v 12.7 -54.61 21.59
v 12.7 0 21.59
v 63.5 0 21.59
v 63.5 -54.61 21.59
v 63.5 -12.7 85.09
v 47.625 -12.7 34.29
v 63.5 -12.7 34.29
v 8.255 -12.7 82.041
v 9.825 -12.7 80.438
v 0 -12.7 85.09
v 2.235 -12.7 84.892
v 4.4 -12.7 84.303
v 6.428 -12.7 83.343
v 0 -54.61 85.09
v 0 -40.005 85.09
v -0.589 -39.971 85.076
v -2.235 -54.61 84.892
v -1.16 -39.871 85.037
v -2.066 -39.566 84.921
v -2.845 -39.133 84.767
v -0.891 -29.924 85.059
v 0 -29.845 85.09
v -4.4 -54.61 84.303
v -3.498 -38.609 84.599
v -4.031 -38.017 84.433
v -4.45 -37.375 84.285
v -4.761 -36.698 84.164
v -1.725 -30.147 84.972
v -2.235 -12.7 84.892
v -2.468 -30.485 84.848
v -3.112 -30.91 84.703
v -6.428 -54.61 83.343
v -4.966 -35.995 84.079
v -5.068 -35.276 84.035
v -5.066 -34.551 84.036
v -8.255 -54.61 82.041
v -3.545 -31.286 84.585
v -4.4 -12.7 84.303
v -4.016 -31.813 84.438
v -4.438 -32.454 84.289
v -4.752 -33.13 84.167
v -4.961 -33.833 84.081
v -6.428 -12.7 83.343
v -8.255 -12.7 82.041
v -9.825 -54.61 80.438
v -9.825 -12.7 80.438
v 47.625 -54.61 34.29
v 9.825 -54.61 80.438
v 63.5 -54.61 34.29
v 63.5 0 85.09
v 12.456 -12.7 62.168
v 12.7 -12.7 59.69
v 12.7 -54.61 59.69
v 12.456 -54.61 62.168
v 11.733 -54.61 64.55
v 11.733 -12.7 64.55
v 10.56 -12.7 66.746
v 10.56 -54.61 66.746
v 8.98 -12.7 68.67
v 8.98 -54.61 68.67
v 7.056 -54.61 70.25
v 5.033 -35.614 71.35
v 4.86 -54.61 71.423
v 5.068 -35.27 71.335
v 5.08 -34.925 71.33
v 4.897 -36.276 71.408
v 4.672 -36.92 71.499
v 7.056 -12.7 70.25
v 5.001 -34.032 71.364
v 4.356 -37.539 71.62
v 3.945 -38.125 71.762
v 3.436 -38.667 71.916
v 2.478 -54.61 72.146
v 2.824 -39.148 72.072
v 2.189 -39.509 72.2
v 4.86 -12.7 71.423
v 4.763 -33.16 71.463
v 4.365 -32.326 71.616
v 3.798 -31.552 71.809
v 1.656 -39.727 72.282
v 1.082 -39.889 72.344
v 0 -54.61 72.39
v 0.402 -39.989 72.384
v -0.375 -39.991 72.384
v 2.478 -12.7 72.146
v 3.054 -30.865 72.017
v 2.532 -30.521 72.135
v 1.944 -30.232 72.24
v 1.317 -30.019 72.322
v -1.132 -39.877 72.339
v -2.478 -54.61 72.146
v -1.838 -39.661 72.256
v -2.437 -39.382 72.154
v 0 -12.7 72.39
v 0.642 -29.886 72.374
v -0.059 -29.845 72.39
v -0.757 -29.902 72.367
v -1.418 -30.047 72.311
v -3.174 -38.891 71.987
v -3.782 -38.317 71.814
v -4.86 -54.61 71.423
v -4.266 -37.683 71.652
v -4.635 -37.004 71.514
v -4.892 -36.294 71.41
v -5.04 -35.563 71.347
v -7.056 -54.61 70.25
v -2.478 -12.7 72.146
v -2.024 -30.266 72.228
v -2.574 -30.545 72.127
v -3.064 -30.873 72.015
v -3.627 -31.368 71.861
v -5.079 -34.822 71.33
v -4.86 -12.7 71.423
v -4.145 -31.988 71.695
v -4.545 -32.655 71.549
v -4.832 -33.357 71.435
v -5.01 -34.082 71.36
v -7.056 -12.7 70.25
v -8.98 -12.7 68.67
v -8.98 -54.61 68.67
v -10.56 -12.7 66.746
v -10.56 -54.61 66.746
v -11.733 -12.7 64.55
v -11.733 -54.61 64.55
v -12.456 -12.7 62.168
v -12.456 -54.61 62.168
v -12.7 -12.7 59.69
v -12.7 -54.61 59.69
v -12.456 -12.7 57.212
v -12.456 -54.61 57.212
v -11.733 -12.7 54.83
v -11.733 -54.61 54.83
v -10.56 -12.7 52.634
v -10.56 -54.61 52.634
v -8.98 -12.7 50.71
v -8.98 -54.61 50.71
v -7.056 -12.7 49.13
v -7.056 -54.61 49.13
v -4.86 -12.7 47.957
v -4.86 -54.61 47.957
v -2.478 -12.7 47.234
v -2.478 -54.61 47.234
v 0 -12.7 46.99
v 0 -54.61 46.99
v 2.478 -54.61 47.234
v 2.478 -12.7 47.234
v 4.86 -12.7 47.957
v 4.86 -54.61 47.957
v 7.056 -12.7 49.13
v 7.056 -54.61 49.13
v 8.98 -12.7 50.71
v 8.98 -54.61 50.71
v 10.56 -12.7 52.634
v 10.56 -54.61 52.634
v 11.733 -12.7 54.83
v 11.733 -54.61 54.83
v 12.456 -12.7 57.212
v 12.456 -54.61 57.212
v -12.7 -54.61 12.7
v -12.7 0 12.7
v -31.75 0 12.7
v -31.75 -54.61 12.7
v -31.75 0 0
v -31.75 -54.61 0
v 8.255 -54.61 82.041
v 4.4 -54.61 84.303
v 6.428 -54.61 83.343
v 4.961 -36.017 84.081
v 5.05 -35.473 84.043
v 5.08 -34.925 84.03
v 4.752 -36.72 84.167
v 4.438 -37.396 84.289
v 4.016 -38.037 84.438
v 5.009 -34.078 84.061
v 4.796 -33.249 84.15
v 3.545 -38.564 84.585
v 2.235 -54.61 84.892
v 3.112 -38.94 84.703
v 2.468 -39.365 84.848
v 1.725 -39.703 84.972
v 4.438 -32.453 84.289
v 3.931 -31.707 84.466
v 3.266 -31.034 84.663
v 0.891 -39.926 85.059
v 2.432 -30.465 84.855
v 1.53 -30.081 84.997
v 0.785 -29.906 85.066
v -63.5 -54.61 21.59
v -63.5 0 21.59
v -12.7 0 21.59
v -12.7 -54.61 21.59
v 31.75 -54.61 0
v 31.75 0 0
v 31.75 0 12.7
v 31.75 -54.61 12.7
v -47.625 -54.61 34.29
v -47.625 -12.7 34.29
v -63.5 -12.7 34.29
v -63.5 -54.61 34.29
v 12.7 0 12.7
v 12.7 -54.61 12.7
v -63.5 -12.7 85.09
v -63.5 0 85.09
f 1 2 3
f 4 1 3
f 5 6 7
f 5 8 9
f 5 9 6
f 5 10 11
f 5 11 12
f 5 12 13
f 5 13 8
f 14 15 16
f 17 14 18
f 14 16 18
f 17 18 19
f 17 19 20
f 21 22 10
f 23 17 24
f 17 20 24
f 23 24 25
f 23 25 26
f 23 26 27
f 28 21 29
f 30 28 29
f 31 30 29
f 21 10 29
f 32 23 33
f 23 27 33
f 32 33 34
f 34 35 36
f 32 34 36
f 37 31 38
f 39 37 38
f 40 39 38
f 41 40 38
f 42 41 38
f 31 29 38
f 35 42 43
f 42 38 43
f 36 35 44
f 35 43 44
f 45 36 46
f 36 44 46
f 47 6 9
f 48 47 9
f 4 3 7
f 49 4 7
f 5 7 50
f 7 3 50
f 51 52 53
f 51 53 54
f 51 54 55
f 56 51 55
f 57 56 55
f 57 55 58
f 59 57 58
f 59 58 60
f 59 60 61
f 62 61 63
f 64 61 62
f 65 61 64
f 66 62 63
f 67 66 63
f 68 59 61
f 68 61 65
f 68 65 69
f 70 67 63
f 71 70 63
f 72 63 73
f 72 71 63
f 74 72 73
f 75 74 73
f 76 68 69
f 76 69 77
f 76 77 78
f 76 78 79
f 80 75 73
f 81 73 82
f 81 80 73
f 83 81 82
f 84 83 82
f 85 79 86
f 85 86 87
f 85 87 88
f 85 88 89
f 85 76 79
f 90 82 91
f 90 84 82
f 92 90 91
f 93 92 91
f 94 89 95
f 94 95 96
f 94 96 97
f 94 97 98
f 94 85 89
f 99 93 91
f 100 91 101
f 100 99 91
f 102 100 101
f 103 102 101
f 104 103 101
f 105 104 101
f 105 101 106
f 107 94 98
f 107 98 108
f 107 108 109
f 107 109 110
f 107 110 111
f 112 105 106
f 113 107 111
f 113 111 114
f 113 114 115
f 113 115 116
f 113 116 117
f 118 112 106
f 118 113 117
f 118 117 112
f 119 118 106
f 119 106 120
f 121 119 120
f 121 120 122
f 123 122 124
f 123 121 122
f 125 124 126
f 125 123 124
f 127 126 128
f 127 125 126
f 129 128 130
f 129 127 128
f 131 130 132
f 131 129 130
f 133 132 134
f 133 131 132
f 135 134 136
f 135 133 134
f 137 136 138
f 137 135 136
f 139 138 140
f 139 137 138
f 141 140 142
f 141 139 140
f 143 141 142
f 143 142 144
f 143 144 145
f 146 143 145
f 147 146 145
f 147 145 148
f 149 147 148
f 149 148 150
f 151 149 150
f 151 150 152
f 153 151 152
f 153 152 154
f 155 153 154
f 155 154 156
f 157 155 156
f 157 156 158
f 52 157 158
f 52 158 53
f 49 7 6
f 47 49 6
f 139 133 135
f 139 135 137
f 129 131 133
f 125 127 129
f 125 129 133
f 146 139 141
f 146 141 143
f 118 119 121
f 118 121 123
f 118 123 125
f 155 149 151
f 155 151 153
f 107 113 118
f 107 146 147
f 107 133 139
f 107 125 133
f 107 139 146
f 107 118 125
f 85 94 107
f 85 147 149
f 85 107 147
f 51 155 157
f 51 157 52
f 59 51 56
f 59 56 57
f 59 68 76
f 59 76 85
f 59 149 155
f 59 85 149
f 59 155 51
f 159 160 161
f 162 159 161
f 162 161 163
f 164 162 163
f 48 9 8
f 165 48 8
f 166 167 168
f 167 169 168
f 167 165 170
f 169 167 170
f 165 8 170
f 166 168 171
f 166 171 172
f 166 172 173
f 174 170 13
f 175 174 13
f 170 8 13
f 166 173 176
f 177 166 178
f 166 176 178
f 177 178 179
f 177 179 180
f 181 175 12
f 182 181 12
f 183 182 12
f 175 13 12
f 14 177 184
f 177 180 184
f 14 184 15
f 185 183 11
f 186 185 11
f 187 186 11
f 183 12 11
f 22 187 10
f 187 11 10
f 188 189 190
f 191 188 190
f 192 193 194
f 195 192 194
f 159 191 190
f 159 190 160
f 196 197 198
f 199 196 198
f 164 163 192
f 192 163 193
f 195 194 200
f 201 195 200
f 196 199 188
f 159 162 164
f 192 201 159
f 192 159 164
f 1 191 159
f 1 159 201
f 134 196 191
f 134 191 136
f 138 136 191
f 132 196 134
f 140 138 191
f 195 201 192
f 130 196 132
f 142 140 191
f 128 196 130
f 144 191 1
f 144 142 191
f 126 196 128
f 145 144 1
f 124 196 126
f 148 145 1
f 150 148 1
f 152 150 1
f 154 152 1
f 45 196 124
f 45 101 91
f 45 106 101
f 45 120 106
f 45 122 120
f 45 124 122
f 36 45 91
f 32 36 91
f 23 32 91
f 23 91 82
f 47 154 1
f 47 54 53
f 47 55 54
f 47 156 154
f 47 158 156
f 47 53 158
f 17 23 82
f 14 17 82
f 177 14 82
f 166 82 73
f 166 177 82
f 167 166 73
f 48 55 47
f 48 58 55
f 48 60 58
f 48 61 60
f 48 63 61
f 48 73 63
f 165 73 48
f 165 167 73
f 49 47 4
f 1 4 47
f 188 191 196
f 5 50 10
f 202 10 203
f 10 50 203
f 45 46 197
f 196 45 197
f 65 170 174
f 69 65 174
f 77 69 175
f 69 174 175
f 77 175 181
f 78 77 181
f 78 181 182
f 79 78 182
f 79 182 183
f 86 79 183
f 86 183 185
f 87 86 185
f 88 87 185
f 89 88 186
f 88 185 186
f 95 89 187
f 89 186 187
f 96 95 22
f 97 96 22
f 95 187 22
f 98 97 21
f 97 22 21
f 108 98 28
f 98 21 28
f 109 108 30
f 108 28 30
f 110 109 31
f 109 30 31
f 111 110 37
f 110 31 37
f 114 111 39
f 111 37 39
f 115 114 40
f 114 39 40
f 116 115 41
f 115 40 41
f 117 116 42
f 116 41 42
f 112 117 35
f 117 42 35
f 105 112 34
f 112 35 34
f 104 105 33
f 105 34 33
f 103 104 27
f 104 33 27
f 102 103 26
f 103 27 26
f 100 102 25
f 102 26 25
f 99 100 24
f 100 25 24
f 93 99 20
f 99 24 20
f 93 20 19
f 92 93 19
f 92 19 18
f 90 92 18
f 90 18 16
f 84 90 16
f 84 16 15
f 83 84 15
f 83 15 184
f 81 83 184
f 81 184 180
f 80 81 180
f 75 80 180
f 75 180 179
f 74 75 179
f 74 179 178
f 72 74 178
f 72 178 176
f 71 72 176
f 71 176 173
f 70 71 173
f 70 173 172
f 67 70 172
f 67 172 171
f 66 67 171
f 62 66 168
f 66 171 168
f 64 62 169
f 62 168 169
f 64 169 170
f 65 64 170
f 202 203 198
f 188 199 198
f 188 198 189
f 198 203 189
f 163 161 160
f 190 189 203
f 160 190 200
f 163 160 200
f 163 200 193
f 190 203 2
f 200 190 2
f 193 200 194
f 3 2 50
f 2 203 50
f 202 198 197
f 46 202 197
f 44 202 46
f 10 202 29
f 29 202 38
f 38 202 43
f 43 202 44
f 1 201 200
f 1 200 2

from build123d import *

# Parameters (mm, degrees)
F0_R     = 12.7
F1_DEPTH = 54.61
F2_DEPTH = 12.7
F3_DEPTH = 12.7
F4_R     = 5.08
F5_DEPTH = 19.05


with BuildPart() as f1:
    # F0 (on Front) → F1 (new body)
    with BuildSketch(Plane.XZ):
        with BuildLine():
            Line((-31.75, 0), (0, 0))
            Line((0, 0), (31.75, 0))
            Line((31.75, 0), (31.75, 12.7))
            Line((31.75, 12.7), (12.7, 12.7))
            Line((12.7, 12.7), (12.7, 21.59))
            Line((12.7, 21.59), (63.5, 21.59))
            Line((63.5, 21.59), (63.5, 34.29))
            Line((63.5, 34.29), (47.625, 34.29))
            Line((47.625, 34.29), (9.824759, 80.437615))
            ThreePointArc((9.824759, 80.437615), (5.435314, 83.868125), (0, 85.09))
            ThreePointArc((0, 85.09), (-5.435314, 83.868125), (-9.824759, 80.437615))
            Line((-9.824759, 80.437615), (-47.625, 34.29))
            Line((-47.625, 34.29), (-63.5, 34.29))
            Line((-63.5, 34.29), (-63.5, 21.59))
            Line((-63.5, 21.59), (-12.7, 21.59))
            Line((-12.7, 21.59), (-12.7, 12.7))
            Line((-12.7, 12.7), (-31.75, 12.7))
            Line((-31.75, 12.7), (-31.75, 0))
        make_face()
        with Locations((0, 59.69)):
            Circle(F0_R, mode=Mode.SUBTRACT)
    extrude(amount=F1_DEPTH)

    # F0 (on Front) → F2 (join)
    with BuildSketch(Plane.XZ):
        with Locations((0, 59.69)):
            Circle(F0_R)
    extrude(amount=F2_DEPTH)

    # F0 (on Front) → F3 (join)
    with BuildSketch(Plane.XZ):
        with BuildLine():
            Line((-63.5, 85.09), (-63.5, 34.29))
            Line((-63.5, 34.29), (-47.625, 34.29))
            Line((-47.625, 34.29), (-9.824759, 80.437615))
            ThreePointArc((-9.824759, 80.437615), (-5.435314, 83.868125), (0, 85.09))
            Line((0, 85.09), (-63.5, 85.09))
        make_face()
        with BuildLine():
            Line((47.625, 34.29), (63.5, 34.29))
            Line((63.5, 34.29), (63.5, 85.09))
            Line((63.5, 85.09), (0, 85.09))
            ThreePointArc((0, 85.09), (5.435314, 83.868125), (9.824759, 80.437615))
            Line((9.824759, 80.437615), (47.625, 34.29))
        make_face()
    extrude(amount=F3_DEPTH)

    # F4 (on face) → F5 (cut)
    with BuildSketch(Plane.XY.offset(85.09)):
        with Locations((0, -34.925)):
            Circle(F4_R)
    extrude(amount=-F5_DEPTH, mode=Mode.SUBTRACT)


solid = f1.part
